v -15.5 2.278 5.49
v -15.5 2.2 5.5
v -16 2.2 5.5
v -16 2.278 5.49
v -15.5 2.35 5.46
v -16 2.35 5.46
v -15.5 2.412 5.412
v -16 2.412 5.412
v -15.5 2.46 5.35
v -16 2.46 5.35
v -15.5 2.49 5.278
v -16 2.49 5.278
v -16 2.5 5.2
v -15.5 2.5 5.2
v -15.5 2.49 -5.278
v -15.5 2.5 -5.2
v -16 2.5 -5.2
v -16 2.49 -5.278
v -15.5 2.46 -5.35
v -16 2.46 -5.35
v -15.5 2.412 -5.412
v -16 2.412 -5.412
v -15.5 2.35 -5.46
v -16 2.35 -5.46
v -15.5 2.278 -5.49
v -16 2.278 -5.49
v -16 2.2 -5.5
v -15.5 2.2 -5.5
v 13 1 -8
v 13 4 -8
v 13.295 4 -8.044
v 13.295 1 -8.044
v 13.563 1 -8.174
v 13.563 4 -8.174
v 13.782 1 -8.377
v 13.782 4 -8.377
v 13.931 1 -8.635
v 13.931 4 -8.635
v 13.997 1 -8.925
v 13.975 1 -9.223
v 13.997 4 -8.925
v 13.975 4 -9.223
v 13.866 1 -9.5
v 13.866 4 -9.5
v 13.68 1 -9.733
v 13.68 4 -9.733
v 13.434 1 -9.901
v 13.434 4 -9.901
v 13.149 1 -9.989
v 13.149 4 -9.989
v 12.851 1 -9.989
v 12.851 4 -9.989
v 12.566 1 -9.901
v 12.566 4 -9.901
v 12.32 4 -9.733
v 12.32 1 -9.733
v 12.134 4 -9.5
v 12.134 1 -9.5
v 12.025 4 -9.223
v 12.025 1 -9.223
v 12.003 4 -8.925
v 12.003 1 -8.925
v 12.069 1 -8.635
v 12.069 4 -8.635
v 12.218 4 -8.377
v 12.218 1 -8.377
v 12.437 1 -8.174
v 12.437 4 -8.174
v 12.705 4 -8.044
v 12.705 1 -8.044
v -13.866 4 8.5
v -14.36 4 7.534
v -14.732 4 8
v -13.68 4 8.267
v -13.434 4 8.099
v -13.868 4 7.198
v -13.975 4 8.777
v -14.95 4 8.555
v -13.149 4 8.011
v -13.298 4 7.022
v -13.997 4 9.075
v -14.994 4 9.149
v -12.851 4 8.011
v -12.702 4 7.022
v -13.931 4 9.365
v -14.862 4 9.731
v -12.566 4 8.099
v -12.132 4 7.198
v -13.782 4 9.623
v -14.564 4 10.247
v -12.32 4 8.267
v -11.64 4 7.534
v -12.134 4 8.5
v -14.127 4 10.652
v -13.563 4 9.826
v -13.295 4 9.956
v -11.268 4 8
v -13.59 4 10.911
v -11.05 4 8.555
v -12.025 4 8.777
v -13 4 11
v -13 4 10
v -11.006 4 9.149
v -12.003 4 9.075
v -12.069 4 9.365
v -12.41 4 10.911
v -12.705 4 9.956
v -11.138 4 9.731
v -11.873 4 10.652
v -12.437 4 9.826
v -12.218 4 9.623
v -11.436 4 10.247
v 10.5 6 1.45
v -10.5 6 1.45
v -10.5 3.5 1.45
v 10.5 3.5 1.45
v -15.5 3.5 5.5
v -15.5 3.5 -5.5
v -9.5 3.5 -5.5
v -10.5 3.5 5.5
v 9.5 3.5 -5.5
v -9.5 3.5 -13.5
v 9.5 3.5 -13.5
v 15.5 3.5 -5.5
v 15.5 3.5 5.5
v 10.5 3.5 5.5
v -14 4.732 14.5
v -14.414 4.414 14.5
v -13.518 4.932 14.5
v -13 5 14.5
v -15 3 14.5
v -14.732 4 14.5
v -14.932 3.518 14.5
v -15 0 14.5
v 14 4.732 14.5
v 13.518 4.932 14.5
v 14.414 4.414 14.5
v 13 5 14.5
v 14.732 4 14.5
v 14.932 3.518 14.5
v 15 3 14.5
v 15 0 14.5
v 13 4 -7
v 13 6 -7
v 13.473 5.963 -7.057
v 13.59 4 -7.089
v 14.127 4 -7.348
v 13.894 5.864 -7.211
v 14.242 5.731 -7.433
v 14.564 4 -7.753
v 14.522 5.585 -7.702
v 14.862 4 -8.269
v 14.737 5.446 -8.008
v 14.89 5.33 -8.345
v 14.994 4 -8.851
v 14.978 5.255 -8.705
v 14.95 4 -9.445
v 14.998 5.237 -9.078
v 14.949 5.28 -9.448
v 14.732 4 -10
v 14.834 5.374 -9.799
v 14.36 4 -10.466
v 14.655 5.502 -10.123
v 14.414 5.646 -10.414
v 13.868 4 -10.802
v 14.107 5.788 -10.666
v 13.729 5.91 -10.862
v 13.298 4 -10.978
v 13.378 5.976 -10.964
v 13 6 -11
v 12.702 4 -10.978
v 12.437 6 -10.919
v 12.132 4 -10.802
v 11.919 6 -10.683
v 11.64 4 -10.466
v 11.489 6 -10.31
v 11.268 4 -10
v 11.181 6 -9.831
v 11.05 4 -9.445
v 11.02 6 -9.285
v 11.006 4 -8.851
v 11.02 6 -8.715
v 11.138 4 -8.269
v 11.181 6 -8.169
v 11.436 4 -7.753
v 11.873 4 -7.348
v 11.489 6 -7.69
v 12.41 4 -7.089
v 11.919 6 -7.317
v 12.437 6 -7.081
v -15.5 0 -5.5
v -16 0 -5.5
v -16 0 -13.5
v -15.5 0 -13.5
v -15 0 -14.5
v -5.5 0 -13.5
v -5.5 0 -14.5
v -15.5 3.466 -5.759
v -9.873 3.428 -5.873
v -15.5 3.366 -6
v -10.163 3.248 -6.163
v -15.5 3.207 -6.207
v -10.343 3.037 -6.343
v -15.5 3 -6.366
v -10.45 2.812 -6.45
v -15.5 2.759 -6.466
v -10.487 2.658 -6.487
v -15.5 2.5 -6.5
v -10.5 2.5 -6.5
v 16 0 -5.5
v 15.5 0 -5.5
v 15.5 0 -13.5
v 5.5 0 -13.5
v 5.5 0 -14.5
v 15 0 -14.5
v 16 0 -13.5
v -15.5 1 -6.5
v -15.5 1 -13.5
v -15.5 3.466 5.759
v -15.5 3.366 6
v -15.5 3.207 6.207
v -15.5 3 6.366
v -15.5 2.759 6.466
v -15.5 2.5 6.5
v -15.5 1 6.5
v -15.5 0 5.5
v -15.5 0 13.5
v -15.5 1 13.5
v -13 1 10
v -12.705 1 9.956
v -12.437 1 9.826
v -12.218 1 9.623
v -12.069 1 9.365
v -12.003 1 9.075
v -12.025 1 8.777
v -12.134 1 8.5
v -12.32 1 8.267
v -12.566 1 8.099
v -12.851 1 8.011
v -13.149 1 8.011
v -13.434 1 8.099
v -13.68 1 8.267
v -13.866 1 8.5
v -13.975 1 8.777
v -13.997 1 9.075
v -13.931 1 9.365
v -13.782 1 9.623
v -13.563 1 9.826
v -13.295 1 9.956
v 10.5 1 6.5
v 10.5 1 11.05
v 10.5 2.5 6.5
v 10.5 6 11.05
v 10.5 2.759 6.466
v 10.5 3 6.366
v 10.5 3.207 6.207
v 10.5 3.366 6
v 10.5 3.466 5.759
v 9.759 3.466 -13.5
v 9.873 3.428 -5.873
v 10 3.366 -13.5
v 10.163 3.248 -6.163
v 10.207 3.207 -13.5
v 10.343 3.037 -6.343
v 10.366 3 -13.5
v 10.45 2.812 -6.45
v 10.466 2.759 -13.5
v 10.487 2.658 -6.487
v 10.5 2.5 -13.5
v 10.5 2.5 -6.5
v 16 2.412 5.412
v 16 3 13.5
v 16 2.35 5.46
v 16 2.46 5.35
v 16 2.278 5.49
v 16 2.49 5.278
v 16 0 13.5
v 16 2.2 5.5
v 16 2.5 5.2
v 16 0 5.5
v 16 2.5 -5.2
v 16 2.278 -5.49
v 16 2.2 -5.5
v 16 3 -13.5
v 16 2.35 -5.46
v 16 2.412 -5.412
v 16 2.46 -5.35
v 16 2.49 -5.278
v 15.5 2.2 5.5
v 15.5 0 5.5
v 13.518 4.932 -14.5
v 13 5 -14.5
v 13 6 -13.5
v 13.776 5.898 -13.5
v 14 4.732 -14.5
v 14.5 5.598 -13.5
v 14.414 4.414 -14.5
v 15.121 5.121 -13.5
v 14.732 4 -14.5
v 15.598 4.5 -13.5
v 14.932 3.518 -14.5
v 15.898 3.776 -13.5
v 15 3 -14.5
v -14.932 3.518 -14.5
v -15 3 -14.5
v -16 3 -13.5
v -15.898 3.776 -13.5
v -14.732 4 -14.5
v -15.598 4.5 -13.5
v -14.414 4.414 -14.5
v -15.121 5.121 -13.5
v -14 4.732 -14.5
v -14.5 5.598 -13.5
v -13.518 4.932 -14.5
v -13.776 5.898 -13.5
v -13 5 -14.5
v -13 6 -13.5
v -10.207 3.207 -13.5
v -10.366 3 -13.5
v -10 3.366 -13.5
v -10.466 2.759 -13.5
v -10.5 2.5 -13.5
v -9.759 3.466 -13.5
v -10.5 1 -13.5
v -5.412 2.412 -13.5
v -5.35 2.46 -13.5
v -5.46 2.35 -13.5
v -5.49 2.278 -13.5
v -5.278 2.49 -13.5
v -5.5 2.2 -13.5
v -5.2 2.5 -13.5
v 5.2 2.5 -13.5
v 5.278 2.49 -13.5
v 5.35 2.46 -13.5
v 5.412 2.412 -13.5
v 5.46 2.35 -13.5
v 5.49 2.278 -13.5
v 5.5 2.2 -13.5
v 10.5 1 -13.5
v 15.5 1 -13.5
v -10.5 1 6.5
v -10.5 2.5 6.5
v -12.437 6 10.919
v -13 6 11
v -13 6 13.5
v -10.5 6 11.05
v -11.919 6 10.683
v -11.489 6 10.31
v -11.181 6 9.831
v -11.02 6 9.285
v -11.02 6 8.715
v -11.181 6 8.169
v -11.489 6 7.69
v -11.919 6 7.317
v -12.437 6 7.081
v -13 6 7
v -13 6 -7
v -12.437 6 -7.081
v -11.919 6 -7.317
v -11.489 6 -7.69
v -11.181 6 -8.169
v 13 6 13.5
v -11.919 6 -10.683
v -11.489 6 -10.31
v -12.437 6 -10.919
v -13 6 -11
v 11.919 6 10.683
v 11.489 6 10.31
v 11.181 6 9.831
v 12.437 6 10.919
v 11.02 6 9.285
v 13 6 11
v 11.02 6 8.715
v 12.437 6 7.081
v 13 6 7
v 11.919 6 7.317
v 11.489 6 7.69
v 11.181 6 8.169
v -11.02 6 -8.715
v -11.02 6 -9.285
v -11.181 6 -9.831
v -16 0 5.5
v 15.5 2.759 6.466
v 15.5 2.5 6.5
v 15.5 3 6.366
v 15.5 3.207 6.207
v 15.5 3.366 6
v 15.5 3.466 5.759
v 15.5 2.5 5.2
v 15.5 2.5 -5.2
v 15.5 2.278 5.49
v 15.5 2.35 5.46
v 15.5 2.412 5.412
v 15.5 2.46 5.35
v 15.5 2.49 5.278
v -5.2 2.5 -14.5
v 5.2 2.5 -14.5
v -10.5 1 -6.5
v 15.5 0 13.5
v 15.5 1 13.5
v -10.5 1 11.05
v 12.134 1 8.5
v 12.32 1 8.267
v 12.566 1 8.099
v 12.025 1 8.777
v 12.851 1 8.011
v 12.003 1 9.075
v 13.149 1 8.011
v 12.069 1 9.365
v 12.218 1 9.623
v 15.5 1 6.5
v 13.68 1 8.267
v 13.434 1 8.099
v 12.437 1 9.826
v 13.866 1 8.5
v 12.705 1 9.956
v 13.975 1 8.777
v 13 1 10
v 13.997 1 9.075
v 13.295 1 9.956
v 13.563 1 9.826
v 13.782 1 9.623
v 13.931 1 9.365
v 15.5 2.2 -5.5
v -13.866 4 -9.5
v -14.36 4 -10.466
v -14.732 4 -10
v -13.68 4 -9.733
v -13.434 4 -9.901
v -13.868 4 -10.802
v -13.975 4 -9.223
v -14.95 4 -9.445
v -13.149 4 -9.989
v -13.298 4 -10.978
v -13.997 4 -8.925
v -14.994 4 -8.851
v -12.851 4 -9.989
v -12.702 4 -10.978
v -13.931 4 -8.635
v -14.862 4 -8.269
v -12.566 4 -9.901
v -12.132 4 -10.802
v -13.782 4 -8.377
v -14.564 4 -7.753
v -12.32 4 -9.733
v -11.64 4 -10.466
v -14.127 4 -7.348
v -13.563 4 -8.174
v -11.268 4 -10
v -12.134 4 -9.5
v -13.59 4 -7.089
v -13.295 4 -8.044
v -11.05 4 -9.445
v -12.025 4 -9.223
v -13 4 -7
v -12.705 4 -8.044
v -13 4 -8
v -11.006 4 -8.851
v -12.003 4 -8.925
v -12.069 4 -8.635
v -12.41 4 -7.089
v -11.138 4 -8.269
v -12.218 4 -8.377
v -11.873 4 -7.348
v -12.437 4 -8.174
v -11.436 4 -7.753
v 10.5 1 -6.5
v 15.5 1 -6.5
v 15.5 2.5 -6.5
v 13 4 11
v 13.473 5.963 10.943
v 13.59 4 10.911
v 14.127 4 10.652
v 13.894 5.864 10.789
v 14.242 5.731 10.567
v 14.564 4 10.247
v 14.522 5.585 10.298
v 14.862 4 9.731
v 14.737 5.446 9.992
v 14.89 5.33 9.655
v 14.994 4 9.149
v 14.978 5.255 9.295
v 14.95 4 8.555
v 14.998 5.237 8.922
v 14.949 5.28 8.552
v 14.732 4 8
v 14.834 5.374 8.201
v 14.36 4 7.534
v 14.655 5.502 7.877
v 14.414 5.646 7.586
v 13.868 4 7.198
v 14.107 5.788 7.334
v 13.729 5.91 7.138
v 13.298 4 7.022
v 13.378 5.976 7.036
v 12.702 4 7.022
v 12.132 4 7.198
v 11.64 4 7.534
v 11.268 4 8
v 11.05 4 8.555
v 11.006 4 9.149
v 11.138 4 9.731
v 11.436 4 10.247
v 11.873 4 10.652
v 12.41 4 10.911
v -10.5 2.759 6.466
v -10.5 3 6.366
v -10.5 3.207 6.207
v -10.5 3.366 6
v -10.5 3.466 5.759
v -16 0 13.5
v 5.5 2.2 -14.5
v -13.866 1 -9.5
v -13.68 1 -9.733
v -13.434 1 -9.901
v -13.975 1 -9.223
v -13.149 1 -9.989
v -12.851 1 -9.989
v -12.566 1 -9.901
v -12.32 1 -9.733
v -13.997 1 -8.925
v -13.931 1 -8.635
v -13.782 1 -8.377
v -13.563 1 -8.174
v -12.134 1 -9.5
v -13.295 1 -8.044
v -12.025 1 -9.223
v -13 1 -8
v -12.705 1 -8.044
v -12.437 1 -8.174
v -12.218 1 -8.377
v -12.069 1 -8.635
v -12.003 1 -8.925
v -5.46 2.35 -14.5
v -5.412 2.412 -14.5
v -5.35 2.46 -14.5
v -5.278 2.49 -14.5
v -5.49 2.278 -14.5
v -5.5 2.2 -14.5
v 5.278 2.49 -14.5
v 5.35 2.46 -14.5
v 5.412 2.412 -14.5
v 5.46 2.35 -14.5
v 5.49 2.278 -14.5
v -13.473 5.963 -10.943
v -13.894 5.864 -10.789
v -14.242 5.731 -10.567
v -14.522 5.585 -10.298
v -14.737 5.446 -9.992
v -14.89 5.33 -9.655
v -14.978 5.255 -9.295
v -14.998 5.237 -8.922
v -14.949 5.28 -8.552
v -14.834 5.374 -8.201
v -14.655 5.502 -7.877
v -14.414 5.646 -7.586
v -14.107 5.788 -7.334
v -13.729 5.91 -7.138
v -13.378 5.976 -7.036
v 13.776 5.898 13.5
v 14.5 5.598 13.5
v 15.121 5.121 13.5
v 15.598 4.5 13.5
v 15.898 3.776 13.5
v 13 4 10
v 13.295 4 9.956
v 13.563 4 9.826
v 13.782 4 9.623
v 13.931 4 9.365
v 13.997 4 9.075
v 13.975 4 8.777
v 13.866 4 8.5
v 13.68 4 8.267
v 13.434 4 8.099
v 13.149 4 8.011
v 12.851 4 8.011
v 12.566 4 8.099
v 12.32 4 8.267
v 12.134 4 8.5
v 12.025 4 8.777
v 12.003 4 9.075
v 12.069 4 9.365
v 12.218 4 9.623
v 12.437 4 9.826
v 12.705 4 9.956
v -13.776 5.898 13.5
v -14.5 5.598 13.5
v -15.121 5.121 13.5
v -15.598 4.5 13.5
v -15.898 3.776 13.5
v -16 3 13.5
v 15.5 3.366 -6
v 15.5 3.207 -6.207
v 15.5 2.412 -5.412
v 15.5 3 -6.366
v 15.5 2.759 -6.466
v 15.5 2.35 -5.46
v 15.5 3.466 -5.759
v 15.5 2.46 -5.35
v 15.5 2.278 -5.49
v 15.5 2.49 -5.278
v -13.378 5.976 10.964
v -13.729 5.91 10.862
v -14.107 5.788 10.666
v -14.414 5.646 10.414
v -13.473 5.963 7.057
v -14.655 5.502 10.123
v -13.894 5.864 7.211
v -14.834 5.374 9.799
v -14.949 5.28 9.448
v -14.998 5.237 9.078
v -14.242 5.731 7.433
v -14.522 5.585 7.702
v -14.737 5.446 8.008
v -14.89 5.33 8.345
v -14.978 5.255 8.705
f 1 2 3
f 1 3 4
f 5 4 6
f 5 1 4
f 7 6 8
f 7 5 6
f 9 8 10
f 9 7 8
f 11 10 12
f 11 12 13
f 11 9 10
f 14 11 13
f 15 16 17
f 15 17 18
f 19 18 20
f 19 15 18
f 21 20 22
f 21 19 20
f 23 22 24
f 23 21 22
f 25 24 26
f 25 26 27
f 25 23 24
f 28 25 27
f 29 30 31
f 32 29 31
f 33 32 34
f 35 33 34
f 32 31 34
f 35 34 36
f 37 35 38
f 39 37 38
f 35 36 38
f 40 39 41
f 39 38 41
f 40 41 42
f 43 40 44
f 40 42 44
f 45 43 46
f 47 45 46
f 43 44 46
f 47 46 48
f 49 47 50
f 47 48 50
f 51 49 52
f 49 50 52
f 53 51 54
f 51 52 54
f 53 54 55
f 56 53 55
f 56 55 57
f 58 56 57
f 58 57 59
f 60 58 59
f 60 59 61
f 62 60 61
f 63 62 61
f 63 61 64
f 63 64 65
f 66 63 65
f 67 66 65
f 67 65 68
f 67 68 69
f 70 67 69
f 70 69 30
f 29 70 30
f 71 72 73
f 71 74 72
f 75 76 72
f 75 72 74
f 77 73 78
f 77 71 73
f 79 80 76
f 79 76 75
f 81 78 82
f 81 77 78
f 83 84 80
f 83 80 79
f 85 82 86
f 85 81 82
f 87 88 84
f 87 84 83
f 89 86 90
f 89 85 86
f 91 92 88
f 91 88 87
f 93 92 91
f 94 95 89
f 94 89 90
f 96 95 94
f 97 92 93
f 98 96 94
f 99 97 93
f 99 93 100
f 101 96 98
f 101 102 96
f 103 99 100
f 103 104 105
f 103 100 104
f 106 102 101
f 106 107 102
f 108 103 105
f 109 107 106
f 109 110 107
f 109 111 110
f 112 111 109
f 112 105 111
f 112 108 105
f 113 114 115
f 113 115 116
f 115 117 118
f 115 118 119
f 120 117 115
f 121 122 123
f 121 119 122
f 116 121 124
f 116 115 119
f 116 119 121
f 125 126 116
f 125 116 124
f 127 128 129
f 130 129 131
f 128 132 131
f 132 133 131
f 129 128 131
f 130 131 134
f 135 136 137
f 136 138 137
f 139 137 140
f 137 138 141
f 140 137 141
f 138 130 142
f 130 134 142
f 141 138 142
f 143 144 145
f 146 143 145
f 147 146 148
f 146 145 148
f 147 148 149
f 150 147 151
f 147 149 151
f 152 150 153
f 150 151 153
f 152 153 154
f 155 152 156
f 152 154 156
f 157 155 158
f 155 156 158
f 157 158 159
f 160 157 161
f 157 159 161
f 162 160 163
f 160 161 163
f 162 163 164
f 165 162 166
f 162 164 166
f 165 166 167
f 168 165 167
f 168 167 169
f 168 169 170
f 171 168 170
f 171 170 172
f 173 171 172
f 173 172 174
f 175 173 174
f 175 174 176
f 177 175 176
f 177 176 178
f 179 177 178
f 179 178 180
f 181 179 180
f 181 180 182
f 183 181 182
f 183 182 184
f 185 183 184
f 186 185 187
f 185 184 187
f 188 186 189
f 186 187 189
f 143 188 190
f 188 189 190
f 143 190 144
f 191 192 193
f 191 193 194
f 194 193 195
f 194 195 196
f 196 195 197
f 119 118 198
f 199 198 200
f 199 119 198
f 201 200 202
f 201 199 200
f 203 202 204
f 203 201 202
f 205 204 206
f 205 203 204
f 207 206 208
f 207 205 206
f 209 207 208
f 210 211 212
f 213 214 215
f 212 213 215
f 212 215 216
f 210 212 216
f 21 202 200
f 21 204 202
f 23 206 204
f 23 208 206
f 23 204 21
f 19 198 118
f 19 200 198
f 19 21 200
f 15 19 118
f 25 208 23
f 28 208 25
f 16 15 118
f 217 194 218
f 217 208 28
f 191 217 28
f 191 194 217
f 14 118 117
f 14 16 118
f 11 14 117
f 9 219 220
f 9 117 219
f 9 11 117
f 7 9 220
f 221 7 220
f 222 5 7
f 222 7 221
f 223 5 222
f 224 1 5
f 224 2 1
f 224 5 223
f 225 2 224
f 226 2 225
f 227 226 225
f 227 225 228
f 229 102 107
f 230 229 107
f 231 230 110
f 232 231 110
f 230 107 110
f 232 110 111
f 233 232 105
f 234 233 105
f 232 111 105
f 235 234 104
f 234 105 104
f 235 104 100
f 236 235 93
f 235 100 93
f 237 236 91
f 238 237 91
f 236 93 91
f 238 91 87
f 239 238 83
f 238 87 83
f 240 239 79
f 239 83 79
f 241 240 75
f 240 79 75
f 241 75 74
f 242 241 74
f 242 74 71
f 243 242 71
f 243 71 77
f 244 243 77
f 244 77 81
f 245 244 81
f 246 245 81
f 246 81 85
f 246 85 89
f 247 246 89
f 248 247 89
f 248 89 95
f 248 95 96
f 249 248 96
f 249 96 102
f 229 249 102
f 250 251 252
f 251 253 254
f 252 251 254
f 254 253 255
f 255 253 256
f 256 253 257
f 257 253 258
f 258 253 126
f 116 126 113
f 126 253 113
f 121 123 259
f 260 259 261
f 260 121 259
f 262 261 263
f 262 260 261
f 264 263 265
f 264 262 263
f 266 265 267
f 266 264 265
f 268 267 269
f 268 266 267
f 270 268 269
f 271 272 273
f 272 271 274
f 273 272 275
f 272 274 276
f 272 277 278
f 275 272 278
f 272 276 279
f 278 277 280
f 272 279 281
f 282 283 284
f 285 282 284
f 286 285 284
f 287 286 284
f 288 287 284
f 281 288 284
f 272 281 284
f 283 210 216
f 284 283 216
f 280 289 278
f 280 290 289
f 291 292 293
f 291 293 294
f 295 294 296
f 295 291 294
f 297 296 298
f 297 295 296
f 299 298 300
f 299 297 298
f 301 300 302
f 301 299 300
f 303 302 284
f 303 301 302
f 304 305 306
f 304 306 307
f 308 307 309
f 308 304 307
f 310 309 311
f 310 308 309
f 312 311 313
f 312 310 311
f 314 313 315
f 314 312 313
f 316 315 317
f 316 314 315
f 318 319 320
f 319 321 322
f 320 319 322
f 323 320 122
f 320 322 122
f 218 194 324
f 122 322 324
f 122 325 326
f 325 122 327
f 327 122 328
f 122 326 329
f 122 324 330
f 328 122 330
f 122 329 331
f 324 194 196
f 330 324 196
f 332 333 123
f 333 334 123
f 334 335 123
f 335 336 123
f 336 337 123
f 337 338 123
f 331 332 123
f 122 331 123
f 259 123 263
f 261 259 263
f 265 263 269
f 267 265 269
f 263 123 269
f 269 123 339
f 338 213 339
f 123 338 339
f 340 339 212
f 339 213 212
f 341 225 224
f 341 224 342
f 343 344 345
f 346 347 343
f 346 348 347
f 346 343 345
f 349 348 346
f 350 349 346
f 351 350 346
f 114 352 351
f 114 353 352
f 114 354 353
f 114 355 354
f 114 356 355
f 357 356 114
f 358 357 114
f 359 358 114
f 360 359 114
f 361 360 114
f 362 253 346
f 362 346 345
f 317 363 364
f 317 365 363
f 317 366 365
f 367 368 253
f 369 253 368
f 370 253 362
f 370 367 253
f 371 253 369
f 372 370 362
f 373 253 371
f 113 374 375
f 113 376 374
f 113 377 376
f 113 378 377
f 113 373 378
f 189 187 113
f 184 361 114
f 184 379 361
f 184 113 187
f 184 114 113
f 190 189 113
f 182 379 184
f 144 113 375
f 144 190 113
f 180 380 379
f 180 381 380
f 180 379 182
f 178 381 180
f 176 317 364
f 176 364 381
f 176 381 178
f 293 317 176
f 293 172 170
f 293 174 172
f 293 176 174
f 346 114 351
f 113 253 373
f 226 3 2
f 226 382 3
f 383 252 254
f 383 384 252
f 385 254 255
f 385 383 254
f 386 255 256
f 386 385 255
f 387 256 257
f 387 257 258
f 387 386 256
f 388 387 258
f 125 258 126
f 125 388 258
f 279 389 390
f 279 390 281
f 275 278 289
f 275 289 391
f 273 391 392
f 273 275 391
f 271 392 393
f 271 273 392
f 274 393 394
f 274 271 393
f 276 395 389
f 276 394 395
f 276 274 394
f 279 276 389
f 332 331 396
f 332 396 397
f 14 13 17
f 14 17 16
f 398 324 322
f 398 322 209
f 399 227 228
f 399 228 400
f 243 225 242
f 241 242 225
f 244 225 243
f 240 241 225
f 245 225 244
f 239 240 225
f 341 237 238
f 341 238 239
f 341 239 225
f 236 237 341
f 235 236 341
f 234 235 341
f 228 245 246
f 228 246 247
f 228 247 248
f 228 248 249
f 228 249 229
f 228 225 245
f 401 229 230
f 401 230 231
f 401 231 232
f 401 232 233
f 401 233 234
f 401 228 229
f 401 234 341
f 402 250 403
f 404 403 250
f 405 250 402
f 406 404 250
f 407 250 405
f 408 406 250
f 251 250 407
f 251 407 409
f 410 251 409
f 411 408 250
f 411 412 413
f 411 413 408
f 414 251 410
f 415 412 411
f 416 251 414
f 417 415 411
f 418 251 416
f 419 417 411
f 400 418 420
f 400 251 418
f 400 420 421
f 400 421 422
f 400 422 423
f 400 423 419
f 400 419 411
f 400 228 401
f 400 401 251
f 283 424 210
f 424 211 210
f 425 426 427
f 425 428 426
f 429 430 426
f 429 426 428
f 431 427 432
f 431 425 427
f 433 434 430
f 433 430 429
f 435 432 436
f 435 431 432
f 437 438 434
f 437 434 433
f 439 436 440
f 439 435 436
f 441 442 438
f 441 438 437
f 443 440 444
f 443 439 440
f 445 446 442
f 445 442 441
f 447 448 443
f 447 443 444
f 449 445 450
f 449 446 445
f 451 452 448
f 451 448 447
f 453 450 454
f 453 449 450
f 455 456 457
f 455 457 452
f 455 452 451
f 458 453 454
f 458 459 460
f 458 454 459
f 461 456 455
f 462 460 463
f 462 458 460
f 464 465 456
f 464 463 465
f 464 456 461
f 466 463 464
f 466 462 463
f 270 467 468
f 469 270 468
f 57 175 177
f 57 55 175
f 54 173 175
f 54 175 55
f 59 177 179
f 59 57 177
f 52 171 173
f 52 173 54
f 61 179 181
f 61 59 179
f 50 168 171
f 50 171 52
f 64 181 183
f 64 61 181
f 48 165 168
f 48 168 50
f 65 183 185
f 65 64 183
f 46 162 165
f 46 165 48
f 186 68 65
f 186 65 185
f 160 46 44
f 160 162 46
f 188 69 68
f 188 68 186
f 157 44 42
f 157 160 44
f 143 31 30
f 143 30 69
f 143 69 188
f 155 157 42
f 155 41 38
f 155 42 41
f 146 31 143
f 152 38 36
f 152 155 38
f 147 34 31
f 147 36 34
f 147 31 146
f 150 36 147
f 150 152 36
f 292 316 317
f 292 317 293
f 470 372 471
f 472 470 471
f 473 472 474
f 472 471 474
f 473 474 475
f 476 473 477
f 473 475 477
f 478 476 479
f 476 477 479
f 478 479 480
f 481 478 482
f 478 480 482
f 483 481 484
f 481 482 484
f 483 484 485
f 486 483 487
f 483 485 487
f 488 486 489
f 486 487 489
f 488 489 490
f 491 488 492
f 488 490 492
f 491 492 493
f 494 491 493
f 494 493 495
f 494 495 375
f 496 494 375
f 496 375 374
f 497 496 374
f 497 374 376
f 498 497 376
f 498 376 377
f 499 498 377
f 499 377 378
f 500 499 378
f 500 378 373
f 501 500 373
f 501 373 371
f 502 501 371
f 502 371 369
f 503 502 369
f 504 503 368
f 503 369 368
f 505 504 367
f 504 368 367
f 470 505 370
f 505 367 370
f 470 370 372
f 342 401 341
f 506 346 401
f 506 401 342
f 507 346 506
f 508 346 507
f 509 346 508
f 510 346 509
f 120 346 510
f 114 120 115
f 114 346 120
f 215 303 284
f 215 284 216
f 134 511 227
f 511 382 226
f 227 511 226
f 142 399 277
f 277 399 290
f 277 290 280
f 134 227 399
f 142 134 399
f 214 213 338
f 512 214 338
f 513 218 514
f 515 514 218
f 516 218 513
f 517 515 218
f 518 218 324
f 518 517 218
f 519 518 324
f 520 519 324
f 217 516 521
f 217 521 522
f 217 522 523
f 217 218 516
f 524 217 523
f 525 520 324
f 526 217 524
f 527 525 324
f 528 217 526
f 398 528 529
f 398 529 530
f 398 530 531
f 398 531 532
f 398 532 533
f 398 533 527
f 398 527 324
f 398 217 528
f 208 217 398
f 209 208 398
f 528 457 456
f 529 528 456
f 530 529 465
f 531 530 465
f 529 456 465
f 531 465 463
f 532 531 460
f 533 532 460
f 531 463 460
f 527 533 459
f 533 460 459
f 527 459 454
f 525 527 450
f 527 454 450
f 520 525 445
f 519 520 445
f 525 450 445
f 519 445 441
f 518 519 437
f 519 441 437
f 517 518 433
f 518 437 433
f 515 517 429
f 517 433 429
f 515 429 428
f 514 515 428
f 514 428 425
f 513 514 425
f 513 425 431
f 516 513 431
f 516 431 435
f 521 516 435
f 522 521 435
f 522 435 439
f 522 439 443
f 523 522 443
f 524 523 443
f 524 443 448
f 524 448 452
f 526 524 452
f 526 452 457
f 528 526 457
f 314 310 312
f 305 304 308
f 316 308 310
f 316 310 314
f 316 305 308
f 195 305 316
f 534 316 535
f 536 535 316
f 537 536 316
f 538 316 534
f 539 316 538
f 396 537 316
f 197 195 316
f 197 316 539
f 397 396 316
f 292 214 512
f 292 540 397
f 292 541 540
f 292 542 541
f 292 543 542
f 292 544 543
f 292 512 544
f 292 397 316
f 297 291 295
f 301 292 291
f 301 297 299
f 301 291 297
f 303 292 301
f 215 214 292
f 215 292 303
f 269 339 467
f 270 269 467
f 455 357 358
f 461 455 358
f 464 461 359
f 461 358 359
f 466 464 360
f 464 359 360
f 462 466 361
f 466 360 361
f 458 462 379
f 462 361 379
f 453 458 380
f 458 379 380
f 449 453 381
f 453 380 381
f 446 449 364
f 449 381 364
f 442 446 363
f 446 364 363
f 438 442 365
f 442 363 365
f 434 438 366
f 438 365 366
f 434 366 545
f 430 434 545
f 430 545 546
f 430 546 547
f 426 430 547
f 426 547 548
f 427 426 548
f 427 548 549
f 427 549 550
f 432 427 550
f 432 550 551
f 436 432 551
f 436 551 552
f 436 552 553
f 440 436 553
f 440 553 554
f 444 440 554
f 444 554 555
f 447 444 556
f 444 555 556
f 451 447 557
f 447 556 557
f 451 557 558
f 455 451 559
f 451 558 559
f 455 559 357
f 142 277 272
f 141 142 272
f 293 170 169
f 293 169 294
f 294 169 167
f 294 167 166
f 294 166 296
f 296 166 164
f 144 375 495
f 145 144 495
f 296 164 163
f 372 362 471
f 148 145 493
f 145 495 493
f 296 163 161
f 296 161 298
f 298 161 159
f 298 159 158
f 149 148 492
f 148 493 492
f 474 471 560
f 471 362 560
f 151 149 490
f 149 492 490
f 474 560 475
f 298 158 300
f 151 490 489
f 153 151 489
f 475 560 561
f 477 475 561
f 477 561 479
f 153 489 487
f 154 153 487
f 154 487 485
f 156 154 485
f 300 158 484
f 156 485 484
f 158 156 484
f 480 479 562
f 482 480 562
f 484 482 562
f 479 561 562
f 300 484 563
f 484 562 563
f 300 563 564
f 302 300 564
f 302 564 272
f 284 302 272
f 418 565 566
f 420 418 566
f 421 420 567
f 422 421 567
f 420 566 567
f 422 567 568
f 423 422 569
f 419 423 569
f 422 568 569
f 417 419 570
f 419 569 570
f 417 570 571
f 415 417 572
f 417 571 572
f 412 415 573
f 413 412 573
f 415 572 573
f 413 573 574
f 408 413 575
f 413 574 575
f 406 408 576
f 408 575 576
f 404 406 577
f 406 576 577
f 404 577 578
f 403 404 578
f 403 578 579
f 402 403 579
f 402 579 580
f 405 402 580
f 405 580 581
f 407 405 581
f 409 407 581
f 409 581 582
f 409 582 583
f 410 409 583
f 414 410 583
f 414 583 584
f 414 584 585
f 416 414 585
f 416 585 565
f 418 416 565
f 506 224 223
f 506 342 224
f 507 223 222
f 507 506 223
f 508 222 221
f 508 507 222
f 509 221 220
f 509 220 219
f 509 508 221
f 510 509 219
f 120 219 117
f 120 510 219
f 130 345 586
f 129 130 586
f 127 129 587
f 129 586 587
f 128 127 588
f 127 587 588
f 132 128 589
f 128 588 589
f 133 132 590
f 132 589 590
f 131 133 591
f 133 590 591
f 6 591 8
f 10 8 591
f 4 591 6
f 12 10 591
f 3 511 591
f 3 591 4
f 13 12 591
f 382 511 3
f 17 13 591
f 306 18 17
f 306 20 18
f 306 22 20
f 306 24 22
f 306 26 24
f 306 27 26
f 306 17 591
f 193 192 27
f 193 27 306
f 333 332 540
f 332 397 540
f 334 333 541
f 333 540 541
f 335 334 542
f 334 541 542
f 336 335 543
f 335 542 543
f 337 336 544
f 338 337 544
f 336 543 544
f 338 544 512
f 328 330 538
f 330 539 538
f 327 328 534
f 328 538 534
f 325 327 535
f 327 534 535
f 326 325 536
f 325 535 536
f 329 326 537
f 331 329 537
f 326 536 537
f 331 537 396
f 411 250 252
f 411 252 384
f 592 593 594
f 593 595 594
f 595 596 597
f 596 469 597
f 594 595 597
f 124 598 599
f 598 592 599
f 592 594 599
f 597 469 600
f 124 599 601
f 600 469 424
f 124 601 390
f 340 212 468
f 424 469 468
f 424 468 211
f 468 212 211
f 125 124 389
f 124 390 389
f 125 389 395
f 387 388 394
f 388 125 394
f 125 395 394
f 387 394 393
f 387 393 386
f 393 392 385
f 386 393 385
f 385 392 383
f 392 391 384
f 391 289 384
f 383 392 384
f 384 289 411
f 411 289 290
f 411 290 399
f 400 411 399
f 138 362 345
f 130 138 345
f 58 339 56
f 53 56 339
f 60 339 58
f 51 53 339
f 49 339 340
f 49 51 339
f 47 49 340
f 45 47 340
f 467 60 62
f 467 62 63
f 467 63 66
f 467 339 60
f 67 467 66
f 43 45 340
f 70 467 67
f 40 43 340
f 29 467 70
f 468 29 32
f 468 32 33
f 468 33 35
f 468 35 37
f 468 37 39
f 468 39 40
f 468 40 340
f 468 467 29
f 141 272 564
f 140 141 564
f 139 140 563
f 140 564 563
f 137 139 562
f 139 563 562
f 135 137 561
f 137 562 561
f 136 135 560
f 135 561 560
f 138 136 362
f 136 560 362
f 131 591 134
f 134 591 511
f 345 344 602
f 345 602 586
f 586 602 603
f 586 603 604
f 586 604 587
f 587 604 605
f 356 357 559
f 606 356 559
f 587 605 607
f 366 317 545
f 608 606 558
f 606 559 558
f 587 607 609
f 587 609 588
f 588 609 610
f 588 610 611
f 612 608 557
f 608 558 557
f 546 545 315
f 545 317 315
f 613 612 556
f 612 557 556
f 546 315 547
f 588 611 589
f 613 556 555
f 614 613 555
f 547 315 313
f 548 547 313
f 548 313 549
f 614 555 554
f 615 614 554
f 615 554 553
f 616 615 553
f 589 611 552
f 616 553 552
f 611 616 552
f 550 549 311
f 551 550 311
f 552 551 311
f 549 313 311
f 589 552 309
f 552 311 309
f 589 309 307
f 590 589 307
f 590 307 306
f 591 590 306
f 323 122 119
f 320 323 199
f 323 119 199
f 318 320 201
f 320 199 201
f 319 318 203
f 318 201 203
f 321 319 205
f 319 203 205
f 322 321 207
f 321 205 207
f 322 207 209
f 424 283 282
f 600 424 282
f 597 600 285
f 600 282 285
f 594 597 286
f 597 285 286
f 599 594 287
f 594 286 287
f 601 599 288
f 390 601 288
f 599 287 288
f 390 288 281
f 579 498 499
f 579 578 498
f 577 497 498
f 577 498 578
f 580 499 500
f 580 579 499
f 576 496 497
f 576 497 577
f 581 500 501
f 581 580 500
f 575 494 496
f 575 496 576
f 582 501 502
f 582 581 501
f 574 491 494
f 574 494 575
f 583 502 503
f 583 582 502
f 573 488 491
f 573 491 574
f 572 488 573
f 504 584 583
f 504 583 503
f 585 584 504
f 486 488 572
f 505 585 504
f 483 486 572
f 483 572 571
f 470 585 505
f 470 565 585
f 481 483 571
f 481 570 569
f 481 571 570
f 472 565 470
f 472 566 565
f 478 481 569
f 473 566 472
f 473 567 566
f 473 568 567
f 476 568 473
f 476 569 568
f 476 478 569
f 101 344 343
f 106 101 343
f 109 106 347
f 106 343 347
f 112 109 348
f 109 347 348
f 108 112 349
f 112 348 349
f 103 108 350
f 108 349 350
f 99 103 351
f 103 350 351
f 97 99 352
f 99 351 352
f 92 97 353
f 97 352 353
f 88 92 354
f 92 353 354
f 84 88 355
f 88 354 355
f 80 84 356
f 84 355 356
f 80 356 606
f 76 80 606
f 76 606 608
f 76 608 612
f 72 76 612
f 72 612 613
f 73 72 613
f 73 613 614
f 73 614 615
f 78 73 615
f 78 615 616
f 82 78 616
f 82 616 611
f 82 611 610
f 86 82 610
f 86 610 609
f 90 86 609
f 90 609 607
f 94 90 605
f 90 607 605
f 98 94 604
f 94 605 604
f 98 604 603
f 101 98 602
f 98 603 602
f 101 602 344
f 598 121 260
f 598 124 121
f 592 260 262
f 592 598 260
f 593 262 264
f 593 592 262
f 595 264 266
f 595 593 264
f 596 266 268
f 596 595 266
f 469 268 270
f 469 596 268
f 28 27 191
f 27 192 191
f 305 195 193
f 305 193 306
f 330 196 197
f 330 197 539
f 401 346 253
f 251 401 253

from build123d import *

# Parameters (mm, degrees)
SKETCH1_W           = 32
SKETCH1_H           = 29
BOSS_EXTRUDE1_DEPTH = 6
SKETCH2_R           = 1
CUT_EXTRUDE1_DEPTH  = 10
SKETCH3_W           = 21
SKETCH3_H           = 9.6
CUT_EXTRUDE2_DEPTH  = 10
SKETCH4_W           = 31
SKETCH4_H           = 27
CUT_EXTRUDE3_DEPTH  = 1
FILLET2_R           = 3
SKETCH5_R           = 2
CUT_EXTRUDE4_DEPTH  = 2
CHAMFER2_SIZE       = 1
SKETCH6_W           = 1
SKETCH6_H           = 11
CUT_EXTRUDE5_DEPTH  = 2.5
FILLET3_R           = 0.3
SKETCH7_W           = 31
SKETCH7_H           = 13
CUT_EXTRUDE6_DEPTH  = 2.5
FILLET4_R           = 1
SKETCH_1_W          = 21
SKETCH_1_H          = 12.05
CUT_EXTRUDE_1_DEPTH = 2.5
FILLET_1_R          = 1
SKETCH_2_W          = 11
SKETCH_2_H          = 2.5
CUT_EXTRUDE_2_DEPTH = 33.802439001
FILLET_2_R          = 0.3


with BuildPart() as part:
    # Sketch1 → Boss-Extrude1 (new body)
    with BuildSketch(Plane(origin=(0, 0, 0), x_dir=(1, 0, 0), z_dir=(0, 1, 0))):
        Rectangle(SKETCH1_W, SKETCH1_H)
    extrude(amount=BOSS_EXTRUDE1_DEPTH)

    # Sketch2 → Cut-Extrude1 (cut)
    with BuildSketch(Plane(origin=(0, 6, 0), x_dir=(1, 0, 0), z_dir=(0, 1, 0))):
        with Locations(Location((-13, 9, 0), (0, 0, 270))):
            Circle(SKETCH2_R)
        with Locations(Location((13, 9, 0), (0, 0, 270))):
            Circle(SKETCH2_R)
        with Locations(Location((13, -9, 0), (0, 0, 270))):
            Circle(SKETCH2_R)
        with Locations(Location((-13, -9, 0), (0, 0, 270))):
            Circle(SKETCH2_R)
    extrude(amount=-CUT_EXTRUDE1_DEPTH, mode=Mode.SUBTRACT)

    # Sketch3 → Cut-Extrude2 (cut)
    with BuildSketch(Plane(origin=(0, 6, 0), x_dir=(1, 0, 0), z_dir=(0, 1, 0))):
        with Locations((0, -6.25)):
            Rectangle(SKETCH3_W, SKETCH3_H)
    extrude(amount=-CUT_EXTRUDE2_DEPTH, mode=Mode.SUBTRACT)

    # Sketch4 → Cut-Extrude3 (cut)
    with BuildSketch(Plane.XZ):
        Rectangle(SKETCH4_W, SKETCH4_H)
    extrude(amount=-CUT_EXTRUDE3_DEPTH, mode=Mode.SUBTRACT)

    # Fillet2
    # the kernel refuses this fillet: 3 mm, written as the material it takes off along each edge
    with BuildSketch(Plane(origin=(16, 6, 22), x_dir=(0, -1, 0), z_dir=(0, 0, -1)), Plane(origin=(-16, 6, -22), x_dir=(0, -1, 0), z_dir=(0, 0, 1))) as fillet2_piece_1:
        with BuildLine():
            CenterArc((FILLET2_R, FILLET2_R), FILLET2_R, 180, 90)
            Line((0, FILLET2_R), (0, 0))
            Line((0, 0), (FILLET2_R, 0))
        make_face()
    extrude(amount=44, mode=Mode.SUBTRACT)

    # Sketch5 → Cut-Extrude4 (cut)
    with BuildSketch(Plane(origin=(0, 6, 0), x_dir=(1, 0, 0), z_dir=(0, 1, 0))):
        with Locations(Location((-13, 9, 0), (0, 0, 270))):
            Circle(SKETCH5_R)
        with Locations(Location((13, 9, 0), (0, 0, 270))):
            Circle(SKETCH5_R)
        with Locations(Location((13, -9, 0), (0, 0, 270))):
            Circle(SKETCH5_R)
        with Locations(Location((-13, -9, 0), (0, 0, 270))):
            Circle(SKETCH5_R)
    extrude(amount=-CUT_EXTRUDE4_DEPTH, mode=Mode.SUBTRACT)

    # Chamfer2
    chamfer2_edges = [part.edges().sort_by_distance(p)[0] for p in [
        (16, 1.5, 14.5),
        (15.121320344, 5.121320344, 14.5),
        (-15.121320344, 5.121320344, 14.5),
        (-16, 1.5, 14.5),
        (-16, 1.5, -14.5),
        (0, 6, -14.5),
        (16, 1.5, -14.5),
        (15.121320344, 5.121320344, -14.5),
        (-15.121320344, 5.121320344, -14.5),
        (0, 6, 14.5),
    ]]
    chamfer(chamfer2_edges, length=CHAMFER2_SIZE)

    # Sketch6 → Cut-Extrude5 (cut)
    with BuildSketch(Plane.XZ):
        with Locations((-15.5, 0)):
            Rectangle(SKETCH6_W, SKETCH6_H)
        with Locations((15.5, 0)):
            Rectangle(SKETCH6_W, SKETCH6_H)
    extrude(amount=-CUT_EXTRUDE5_DEPTH, mode=Mode.SUBTRACT)

    # Fillet3
    fillet3_edges = [part.edges().sort_by_distance(p)[0] for p in [
        (-15.5, 2.5, 5.5),
        (-15.5, 2.5, -5.5),
        (15.5, 2.5, -5.5),
        (15.5, 2.5, 5.5),
    ]]
    fillet(fillet3_edges, radius=FILLET3_R)

    # Sketch7 → Cut-Extrude6 (cut)
    with BuildSketch(Plane.XZ.offset(-1)):
        Rectangle(SKETCH7_W, SKETCH7_H)
    extrude(amount=-CUT_EXTRUDE6_DEPTH, mode=Mode.SUBTRACT)

    # Fillet4
    fillet4_edges = [part.edges().sort_by_distance(p)[0] for p in [
        (-13, 3.5, 6.5),
        (13, 3.5, 6.5),
        (0, 3.5, -6.5),
    ]]
    fillet(fillet4_edges, radius=FILLET4_R)

    # Эскиз1 → Вырез-Вытянуть1 (cut)
    with BuildSketch(Plane.XZ.offset(-1)):
        with Locations((0, -7.475)):
            Rectangle(SKETCH_1_W, SKETCH_1_H)
    extrude(amount=-CUT_EXTRUDE_1_DEPTH, mode=Mode.SUBTRACT)

    # Скругление1
    fillet_1_edges = [part.edges().sort_by_distance(p)[0] for p in [
        (10.5, 3.5, -9.5),
        (-10.5, 3.5, -9.5),
    ]]
    fillet(fillet_1_edges, radius=FILLET_1_R)

    # Эскиз2 → Вырез-Вытянуть2 (cut, through all)
    with BuildSketch(Plane.XY.offset(-13.5)):
        with Locations((0, 1.25)):
            Rectangle(SKETCH_2_W, SKETCH_2_H)
    extrude(amount=-CUT_EXTRUDE_2_DEPTH, mode=Mode.SUBTRACT)

    # Скругление2
    fillet_2_edges = [part.edges().sort_by_distance(p)[0] for p in [
        (5.5, 2.5, -14),
        (-5.5, 2.5, -14),
    ]]
    fillet(fillet_2_edges, radius=FILLET_2_R)


solid = part.part
